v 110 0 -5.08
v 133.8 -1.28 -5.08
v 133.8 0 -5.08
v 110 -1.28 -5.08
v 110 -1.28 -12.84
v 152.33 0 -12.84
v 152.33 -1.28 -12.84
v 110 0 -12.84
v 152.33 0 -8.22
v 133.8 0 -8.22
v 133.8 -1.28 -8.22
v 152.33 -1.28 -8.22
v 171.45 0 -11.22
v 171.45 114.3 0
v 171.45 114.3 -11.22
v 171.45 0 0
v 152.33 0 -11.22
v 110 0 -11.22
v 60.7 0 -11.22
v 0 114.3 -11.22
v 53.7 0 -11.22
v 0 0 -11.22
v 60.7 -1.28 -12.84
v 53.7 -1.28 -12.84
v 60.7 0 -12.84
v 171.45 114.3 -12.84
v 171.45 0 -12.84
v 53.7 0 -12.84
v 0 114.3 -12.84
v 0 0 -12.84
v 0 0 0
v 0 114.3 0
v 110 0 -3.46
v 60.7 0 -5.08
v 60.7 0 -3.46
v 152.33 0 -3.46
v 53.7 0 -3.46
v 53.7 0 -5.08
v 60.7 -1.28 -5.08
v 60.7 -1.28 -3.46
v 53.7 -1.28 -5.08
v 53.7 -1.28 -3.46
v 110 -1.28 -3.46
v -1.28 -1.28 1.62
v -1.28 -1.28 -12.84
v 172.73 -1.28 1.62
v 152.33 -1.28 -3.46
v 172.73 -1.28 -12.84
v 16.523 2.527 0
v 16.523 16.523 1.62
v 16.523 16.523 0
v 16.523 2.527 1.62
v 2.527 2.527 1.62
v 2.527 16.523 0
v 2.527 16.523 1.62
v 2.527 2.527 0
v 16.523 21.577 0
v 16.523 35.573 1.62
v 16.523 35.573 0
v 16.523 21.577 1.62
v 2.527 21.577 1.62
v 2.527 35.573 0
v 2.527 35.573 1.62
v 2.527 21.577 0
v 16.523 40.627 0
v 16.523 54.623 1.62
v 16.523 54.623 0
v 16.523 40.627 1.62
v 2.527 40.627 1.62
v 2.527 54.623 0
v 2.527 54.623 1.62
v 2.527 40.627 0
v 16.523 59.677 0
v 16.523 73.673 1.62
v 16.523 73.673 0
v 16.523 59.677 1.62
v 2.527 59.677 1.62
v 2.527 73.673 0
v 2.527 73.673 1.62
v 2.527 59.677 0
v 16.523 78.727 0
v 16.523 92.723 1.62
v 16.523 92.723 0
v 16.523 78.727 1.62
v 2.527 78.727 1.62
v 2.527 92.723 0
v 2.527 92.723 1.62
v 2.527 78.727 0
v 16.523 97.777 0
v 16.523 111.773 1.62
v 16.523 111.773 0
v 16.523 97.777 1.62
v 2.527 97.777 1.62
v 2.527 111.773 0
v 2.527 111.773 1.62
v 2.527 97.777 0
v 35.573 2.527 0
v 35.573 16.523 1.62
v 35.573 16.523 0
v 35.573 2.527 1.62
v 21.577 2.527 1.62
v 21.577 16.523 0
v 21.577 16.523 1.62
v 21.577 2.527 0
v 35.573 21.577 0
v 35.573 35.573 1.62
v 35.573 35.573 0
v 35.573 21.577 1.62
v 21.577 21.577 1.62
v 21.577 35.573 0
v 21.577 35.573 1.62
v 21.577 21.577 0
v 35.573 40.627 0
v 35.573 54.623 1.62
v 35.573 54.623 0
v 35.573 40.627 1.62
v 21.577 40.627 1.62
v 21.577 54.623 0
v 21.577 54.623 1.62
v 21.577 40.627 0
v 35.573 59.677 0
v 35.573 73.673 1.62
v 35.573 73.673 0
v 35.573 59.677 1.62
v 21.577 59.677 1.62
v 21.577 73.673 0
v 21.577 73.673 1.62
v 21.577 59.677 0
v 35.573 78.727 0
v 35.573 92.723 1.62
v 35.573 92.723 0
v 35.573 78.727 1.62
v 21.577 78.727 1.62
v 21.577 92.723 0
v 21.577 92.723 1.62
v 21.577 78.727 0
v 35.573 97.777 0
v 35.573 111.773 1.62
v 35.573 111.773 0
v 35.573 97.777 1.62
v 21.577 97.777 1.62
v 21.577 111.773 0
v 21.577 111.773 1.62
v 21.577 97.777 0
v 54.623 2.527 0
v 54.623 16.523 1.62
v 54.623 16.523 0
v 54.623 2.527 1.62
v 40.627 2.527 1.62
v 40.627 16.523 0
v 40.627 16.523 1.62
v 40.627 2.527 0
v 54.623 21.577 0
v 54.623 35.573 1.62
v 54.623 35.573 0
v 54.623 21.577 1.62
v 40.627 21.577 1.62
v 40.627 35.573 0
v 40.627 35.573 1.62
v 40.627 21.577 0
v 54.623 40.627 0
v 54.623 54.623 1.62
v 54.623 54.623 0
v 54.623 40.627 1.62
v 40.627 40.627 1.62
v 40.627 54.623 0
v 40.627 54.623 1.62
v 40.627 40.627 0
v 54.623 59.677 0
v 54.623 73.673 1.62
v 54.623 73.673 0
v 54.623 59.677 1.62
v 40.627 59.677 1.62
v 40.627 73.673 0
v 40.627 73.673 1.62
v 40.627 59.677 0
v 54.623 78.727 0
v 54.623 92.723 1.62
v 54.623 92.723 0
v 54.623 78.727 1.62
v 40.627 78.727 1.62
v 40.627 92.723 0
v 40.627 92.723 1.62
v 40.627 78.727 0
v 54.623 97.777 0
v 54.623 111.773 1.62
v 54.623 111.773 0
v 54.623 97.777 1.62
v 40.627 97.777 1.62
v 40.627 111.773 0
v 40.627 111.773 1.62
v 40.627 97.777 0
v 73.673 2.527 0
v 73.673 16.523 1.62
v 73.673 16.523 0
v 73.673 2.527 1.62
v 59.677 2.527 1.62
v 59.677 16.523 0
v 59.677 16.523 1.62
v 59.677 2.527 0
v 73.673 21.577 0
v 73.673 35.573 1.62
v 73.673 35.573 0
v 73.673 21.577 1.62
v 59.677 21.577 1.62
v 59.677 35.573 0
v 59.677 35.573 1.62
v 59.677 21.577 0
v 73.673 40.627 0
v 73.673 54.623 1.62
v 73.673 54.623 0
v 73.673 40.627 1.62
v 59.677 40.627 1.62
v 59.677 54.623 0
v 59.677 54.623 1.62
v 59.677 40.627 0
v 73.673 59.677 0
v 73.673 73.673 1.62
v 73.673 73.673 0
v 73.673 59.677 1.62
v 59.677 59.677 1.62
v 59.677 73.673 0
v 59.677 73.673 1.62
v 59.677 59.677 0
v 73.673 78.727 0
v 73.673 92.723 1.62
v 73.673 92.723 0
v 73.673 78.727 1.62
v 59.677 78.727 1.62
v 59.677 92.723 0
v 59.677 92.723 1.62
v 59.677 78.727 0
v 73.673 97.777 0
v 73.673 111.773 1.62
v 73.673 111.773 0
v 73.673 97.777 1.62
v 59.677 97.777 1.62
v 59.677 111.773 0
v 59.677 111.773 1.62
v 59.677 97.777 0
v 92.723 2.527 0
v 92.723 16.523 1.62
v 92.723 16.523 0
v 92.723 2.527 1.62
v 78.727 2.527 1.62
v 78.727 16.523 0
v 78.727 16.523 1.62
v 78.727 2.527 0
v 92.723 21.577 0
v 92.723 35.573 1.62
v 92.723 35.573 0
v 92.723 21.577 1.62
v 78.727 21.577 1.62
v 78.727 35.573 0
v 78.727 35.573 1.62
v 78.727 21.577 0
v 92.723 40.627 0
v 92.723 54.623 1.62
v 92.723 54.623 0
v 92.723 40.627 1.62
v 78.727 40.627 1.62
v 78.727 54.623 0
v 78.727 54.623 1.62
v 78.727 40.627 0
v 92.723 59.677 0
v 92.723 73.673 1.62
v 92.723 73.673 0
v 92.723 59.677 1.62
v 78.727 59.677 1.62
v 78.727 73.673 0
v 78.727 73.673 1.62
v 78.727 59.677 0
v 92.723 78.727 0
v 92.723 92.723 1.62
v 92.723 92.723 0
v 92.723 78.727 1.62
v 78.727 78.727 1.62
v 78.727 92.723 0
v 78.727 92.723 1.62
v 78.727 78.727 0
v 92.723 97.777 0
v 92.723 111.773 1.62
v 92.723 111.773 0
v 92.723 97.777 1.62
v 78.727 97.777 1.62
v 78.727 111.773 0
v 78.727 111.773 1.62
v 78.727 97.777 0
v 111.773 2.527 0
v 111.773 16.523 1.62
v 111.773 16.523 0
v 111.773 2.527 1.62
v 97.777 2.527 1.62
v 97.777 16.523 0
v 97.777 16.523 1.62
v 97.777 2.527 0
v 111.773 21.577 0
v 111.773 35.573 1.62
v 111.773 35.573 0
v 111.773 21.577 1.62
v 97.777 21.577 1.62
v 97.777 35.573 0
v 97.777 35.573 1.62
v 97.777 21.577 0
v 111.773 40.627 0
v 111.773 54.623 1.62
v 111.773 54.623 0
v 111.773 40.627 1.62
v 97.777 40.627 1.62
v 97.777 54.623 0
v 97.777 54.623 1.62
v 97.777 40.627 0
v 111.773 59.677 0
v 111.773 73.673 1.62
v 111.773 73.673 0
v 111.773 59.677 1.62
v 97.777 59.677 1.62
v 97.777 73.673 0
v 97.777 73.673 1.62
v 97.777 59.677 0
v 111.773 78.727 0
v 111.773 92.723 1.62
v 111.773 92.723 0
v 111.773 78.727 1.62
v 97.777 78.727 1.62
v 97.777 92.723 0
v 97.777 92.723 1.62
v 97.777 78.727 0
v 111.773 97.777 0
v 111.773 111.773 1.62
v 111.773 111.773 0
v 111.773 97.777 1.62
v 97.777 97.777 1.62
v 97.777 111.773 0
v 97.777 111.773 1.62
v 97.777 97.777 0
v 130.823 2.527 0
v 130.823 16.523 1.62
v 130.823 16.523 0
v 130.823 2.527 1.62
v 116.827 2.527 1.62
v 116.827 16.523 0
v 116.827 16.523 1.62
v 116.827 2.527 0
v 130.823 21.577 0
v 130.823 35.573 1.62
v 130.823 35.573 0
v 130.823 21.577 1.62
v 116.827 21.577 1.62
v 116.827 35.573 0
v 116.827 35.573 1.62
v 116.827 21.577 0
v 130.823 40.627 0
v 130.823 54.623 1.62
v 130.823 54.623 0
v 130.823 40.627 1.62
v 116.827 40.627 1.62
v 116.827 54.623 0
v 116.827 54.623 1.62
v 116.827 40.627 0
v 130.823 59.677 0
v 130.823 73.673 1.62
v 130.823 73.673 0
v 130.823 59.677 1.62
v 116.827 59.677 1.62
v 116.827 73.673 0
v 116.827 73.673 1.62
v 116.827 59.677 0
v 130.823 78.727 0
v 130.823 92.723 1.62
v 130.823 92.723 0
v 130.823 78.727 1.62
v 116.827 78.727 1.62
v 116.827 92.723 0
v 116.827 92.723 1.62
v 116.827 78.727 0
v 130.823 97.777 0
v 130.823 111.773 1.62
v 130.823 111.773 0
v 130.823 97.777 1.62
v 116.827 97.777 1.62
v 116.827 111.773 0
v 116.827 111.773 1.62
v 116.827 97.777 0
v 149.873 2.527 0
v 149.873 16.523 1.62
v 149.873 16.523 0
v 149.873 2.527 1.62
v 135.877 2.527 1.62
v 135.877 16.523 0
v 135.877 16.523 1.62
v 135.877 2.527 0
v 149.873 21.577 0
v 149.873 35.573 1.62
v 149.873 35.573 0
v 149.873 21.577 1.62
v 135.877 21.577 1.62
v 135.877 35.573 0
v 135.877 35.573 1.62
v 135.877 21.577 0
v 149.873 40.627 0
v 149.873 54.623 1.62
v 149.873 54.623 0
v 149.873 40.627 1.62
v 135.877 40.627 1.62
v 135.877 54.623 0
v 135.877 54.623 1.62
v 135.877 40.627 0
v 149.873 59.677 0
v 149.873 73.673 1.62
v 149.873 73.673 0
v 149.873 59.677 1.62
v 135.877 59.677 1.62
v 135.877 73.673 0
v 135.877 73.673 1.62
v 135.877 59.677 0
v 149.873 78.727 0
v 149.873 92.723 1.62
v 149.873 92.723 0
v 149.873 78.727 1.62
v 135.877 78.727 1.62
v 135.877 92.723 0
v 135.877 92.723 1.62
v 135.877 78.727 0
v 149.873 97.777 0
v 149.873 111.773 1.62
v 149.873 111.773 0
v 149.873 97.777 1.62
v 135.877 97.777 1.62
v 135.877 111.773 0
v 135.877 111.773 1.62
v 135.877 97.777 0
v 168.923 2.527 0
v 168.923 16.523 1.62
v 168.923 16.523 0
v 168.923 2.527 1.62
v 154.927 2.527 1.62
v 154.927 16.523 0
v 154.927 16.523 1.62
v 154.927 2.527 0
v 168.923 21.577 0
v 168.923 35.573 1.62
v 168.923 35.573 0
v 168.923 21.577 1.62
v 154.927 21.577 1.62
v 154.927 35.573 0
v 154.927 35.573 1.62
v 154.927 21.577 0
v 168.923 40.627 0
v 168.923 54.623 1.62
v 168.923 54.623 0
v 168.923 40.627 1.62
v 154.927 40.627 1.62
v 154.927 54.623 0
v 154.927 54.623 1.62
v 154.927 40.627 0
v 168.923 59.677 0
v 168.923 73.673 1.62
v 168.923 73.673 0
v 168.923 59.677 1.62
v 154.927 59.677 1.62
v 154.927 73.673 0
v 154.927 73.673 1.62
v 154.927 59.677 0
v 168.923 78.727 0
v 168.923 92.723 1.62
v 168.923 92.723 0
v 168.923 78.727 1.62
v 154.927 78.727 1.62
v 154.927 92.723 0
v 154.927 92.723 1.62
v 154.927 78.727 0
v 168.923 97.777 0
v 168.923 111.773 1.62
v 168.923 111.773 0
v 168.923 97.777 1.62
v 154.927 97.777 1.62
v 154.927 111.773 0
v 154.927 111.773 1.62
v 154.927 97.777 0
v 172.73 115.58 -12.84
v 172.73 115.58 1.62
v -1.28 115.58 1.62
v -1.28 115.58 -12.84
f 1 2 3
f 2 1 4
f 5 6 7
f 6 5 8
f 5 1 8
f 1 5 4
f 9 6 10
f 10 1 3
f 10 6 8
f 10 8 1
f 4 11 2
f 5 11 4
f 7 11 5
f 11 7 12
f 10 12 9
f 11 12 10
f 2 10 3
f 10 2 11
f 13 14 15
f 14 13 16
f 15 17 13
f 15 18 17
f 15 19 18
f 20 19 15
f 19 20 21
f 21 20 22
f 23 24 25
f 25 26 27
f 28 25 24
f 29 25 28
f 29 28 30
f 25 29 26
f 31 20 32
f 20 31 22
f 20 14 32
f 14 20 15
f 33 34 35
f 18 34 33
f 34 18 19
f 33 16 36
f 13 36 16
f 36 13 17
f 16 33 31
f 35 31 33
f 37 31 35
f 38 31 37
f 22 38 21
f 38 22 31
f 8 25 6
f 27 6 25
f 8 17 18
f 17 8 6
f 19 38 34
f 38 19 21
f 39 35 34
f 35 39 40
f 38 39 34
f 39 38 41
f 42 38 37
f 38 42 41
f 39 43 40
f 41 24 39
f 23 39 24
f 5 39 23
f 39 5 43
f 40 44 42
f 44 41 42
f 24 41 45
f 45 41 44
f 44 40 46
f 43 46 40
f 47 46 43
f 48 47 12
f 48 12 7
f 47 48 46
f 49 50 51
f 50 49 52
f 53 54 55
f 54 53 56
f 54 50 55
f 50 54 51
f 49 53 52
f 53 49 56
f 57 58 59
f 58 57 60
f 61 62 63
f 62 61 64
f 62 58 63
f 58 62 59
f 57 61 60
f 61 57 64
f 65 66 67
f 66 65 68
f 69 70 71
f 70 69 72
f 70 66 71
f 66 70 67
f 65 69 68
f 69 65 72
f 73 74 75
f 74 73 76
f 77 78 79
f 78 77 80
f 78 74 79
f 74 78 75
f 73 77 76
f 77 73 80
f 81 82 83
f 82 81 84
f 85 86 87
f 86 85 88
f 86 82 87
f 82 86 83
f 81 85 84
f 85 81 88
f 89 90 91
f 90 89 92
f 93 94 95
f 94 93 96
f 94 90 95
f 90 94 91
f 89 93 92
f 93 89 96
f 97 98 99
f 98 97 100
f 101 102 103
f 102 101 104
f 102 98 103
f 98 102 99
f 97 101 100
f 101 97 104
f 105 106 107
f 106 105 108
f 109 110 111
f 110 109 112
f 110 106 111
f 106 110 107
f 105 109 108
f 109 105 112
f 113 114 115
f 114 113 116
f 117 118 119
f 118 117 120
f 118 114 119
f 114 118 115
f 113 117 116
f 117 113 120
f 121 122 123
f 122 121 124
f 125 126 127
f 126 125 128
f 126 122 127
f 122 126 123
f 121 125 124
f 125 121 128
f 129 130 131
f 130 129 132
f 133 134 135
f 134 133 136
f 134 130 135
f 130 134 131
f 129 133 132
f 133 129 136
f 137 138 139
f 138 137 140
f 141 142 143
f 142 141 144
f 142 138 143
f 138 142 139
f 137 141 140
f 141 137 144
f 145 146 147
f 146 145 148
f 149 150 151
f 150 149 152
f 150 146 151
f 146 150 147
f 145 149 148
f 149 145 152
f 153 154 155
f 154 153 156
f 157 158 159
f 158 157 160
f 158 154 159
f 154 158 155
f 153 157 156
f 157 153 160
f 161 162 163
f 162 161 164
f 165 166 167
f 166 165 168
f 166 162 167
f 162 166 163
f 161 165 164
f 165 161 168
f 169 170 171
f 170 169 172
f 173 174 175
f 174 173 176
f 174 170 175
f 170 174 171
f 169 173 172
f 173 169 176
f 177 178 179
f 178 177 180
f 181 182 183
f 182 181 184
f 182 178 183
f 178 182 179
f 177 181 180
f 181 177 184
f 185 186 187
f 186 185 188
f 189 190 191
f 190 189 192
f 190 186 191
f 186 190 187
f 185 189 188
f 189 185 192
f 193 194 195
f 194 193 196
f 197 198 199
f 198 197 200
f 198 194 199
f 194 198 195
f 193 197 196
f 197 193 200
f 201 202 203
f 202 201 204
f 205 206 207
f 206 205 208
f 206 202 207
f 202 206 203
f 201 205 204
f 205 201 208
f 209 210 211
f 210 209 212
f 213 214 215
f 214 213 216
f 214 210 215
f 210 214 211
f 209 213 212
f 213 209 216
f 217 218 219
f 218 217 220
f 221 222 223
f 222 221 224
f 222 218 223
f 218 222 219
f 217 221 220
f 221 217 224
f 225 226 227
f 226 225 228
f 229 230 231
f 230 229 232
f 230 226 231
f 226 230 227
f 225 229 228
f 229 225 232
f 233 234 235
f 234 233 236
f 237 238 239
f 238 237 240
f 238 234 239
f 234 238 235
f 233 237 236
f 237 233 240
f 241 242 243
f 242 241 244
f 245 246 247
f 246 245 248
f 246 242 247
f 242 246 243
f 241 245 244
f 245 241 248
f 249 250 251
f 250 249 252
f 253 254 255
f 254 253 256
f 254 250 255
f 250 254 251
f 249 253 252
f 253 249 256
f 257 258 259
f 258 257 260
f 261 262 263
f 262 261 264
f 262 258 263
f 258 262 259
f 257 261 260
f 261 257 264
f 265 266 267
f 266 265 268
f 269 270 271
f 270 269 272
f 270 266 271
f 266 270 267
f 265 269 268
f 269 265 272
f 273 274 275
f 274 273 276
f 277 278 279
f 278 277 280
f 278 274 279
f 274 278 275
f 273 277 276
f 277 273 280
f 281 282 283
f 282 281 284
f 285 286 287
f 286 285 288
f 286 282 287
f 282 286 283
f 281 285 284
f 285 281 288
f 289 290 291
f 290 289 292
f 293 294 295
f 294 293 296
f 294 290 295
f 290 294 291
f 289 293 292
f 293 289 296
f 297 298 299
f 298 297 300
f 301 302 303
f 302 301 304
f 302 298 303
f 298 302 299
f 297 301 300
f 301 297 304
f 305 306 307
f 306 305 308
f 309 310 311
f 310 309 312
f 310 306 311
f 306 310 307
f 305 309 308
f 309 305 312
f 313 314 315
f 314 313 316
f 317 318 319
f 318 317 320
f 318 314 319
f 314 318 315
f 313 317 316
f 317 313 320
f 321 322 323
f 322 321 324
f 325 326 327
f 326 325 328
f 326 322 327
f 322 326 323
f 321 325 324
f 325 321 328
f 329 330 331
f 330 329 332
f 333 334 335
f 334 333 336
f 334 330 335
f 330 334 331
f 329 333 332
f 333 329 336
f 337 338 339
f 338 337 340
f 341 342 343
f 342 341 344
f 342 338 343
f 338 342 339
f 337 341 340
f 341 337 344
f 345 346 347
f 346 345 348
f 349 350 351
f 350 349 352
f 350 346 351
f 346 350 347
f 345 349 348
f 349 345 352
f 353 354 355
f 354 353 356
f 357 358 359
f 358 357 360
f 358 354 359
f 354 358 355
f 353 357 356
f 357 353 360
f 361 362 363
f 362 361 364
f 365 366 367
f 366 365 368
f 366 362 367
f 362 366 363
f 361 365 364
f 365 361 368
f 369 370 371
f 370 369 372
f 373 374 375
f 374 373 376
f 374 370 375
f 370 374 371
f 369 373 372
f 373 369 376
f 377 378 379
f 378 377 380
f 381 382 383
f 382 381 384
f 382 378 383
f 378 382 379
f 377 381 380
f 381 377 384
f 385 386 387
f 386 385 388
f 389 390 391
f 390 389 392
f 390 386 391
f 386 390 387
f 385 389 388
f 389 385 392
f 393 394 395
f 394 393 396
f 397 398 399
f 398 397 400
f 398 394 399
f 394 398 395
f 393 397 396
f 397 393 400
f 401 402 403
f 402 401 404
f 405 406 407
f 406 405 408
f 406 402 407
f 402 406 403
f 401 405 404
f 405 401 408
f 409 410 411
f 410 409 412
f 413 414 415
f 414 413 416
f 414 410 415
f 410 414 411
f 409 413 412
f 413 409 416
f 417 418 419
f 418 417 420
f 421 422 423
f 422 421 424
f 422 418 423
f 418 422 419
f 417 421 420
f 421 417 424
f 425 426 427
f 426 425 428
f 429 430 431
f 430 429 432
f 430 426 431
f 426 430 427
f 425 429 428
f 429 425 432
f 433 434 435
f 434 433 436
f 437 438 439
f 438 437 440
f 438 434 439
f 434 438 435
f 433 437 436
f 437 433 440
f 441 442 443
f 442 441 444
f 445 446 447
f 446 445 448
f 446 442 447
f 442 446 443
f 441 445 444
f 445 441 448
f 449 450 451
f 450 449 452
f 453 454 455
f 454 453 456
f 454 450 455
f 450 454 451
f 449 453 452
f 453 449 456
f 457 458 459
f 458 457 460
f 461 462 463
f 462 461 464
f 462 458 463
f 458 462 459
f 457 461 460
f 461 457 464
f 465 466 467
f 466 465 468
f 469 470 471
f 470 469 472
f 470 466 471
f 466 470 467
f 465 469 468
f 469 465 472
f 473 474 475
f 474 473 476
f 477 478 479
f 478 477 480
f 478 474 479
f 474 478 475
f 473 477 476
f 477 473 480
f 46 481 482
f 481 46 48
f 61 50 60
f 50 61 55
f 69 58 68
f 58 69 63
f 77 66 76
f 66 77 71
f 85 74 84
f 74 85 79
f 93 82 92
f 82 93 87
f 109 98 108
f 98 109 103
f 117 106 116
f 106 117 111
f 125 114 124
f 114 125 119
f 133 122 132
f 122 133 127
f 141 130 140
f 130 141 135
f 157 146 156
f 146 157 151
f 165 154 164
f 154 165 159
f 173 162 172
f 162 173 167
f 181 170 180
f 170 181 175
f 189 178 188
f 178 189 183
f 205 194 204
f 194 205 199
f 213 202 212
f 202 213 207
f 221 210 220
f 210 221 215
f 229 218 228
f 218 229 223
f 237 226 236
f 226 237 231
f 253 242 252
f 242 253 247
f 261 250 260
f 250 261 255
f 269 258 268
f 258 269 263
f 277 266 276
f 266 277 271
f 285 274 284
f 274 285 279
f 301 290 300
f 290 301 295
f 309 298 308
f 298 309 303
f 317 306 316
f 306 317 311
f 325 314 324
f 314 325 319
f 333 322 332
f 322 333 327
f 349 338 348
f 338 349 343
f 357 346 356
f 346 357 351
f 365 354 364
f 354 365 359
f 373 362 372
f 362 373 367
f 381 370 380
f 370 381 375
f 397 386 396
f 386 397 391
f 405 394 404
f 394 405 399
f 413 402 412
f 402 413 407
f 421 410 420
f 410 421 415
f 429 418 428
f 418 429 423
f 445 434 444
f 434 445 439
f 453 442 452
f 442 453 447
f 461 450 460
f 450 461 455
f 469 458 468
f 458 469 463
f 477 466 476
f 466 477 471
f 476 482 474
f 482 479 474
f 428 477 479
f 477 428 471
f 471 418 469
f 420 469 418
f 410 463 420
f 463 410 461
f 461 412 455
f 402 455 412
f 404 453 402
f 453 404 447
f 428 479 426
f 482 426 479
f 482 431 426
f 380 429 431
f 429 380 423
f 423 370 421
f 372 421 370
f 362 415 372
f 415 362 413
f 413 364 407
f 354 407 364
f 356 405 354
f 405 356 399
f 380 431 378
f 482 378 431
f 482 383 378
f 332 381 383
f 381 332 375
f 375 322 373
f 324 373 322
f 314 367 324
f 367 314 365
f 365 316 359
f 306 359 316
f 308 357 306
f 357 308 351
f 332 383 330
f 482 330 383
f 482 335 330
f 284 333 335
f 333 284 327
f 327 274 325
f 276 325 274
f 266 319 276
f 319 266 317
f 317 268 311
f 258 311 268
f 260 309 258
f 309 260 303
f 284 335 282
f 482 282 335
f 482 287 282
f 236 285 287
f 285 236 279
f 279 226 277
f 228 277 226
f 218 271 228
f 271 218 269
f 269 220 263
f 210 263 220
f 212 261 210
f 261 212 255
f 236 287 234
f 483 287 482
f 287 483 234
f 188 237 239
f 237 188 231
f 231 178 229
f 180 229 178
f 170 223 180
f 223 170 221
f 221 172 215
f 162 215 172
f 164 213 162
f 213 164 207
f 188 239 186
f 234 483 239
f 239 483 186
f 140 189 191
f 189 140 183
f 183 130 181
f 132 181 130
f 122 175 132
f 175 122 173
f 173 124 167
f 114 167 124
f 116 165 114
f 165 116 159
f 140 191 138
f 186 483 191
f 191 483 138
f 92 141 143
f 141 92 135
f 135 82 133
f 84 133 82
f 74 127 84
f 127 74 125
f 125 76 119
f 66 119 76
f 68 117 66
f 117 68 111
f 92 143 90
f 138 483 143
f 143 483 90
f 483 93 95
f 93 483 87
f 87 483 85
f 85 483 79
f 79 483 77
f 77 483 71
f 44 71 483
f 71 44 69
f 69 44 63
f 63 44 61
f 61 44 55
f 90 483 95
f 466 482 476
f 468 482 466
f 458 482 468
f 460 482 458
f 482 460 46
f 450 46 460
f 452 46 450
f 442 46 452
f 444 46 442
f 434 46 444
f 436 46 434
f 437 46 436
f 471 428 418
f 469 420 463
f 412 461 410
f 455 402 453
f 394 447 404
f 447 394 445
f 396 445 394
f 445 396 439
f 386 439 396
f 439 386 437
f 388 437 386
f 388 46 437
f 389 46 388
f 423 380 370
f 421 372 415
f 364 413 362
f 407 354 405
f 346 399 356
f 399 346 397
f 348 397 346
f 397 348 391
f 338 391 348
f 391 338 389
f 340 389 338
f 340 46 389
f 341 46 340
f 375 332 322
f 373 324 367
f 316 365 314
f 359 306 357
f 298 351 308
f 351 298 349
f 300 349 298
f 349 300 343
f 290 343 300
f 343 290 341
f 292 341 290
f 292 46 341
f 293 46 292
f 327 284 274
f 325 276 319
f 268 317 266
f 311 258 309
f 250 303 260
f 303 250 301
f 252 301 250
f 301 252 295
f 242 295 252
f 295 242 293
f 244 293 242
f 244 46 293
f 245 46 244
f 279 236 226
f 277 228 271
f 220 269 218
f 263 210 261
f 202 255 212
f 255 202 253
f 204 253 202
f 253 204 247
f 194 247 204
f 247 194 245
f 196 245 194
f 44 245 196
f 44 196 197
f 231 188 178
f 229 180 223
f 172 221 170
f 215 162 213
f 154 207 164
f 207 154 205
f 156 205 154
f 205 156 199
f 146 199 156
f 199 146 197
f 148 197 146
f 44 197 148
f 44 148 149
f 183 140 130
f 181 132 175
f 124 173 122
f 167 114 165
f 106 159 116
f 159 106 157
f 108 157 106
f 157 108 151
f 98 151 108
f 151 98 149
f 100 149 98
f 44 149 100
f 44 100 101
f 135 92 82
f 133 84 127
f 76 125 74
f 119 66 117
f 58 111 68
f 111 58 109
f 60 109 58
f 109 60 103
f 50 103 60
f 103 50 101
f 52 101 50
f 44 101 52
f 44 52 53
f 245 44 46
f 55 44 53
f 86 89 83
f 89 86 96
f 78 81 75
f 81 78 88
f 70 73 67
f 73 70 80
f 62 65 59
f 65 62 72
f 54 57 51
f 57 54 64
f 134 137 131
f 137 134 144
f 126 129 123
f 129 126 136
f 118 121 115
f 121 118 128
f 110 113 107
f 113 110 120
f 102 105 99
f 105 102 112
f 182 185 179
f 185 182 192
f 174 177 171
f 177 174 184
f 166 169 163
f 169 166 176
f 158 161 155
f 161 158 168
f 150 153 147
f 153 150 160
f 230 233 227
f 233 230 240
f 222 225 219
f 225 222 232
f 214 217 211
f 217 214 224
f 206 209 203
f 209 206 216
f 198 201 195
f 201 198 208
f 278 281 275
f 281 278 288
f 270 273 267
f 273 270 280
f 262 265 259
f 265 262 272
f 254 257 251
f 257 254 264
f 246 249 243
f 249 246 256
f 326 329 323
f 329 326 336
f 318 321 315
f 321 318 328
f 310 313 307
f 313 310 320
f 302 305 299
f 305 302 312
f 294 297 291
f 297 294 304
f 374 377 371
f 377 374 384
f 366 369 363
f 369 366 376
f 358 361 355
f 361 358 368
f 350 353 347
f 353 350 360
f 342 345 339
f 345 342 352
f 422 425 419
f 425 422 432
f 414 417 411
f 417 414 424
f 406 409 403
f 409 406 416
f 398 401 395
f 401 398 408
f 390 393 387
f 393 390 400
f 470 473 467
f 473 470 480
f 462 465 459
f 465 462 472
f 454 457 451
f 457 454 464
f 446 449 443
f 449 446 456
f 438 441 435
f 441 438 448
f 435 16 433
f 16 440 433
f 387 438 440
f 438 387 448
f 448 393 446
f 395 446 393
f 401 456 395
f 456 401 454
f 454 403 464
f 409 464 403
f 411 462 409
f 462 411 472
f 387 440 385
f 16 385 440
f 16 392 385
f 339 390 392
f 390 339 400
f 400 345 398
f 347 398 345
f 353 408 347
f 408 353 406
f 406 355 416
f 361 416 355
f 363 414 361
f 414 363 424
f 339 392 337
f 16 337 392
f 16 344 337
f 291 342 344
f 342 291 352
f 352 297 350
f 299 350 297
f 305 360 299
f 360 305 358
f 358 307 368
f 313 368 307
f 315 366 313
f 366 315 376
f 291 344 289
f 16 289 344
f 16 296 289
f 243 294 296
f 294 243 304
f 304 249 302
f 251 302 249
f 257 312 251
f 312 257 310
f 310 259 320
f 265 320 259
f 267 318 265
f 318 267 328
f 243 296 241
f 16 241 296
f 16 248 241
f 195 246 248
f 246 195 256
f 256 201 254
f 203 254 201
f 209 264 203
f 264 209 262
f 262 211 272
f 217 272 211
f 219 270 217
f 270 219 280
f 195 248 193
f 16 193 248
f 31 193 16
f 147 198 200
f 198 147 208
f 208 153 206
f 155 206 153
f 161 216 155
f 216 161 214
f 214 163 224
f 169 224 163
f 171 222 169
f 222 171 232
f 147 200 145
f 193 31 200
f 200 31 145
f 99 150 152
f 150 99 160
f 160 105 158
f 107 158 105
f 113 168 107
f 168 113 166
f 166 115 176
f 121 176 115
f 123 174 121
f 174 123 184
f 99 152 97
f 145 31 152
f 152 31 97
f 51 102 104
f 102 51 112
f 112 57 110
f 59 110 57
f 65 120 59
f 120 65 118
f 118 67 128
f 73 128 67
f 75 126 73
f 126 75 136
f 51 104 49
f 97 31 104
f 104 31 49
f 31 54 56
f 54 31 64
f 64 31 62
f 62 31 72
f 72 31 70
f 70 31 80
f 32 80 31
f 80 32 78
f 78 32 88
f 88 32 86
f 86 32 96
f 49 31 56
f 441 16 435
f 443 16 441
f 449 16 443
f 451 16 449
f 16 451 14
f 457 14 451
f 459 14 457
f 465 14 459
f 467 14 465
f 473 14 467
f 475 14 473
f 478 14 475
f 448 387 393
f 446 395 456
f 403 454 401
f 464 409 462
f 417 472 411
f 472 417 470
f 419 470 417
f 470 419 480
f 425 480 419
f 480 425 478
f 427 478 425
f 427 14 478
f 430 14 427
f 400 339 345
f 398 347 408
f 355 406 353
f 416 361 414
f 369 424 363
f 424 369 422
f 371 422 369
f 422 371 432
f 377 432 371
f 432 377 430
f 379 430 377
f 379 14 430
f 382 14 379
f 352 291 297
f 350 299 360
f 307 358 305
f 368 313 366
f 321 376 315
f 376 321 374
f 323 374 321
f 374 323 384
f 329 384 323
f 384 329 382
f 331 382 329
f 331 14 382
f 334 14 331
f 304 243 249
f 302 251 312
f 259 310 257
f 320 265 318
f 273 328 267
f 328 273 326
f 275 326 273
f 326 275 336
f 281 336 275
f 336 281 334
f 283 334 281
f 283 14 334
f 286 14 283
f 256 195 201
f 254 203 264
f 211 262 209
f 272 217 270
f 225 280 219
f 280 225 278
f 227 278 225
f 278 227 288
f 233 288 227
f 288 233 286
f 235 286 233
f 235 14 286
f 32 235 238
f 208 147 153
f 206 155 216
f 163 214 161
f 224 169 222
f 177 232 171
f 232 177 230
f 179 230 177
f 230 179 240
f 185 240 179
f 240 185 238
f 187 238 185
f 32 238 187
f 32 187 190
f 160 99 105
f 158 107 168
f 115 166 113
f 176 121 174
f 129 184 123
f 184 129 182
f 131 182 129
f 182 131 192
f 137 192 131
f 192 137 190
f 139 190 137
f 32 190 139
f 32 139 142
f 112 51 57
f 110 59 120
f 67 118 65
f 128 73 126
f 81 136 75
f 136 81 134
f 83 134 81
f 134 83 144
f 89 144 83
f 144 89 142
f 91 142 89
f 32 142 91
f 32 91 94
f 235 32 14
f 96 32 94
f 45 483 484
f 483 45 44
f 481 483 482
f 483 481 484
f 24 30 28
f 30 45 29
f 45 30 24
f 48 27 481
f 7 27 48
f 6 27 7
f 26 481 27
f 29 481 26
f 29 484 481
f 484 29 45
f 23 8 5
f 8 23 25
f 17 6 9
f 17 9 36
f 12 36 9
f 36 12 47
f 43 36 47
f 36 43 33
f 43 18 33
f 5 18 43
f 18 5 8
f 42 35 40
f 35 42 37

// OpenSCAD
/*
 * consider sawing of jack
 * consider rounding corners
 * front needs design
 * find min height
 * add jacks
 * add reset button
 */

// non-design measurements
key_spacing = 19.05;
key_cutout_w = .551*25.4;

pcb_x = 171.45;
pcb_y = 116.60;
pcb_y2 = 111.8;
bump_out = pcb_y - pcb_y2;
bump_in = 6*key_spacing - pcb_y2;
pcb_thickness = 1.62;
bump1_x = 19.12; // from the other side
bump1_w = 42.33;
bump2_x = 53.7;
bump2_w = 7.00;

usb_pcb_thicc = 3.14;
usb_pcb_width = 18.53;


//distance from the top of the pcb to the
top_layer_thickness = .197 * 25.4;
// distance from the bottom of the pcb to the bottom of the keycaps
a = .43*25.4;
// distance from the bot of the case to the top of the pcb
cutout_h = .20 * 25.4 - pcb_thickness;

stud_diameter = 4.0;
stud_locations = [
    [1,1], [1,2], [1,3], [1,4],
    [3,1], [3,2], [3,3], [3,5],
    [6,1], [6,2], [6,3], [6,5], 
    [8,1], [8,2], [8,4], [8,5], 
];

// design measurements

//layer_height = .35;
wall_thicc = 1.28;
bott_solder_room = 3;
// doesn't actually include top layer
tot_height = cutout_h + usb_pcb_thicc + 2 * pcb_thickness + bott_solder_room; 

module top_test(){
    difference(){
        cube([key_spacing,key_spacing,pcb_thickness], center=true);
        cube([key_cutout_w,key_cutout_w,pcb_thickness*2], center=true);
    }
}

module top_layer_old(){
    difference(){
        for(i=[.5:9.5],j=[.5:6.5]){
            translate([i*key_spacing, j*key_spacing, pcb_thickness/2]) cube([key_cutout_w,key_cutout_w,pcb_thickness*2], center=true);
        }
    }
}

module top_shell(){
    //top part
    difference(){
        translate([-wall_thicc,-wall_thicc,0])
            cube([key_spacing*9+2*wall_thicc, key_spacing*6+2*wall_thicc, pcb_thickness]);
        for(i=[.5:9.5],j=[.5:6.5]){
            translate([i*key_spacing, j*key_spacing, pcb_thickness/2]) cube([key_cutout_w,key_cutout_w,pcb_thickness*2], center=true);
        }
    }
    //walls
    difference(){
        translate([-wall_thicc,-wall_thicc,-tot_height])
            cube([key_spacing*9+2*wall_thicc, key_spacing*6+2*wall_thicc, tot_height]);
        translate([0,0,-tot_height-1])
            cube([key_spacing*9, key_spacing*6, tot_height+2]);
        
        //gaps for jack, usb
        translate([key_spacing*9-bump1_x-bump1_w,-wall_thicc*1.5,-cutout_h-tot_height])
            cube([bump1_w,wall_thicc*2,tot_height]);
        translate([bump2_x,-wall_thicc*1.5,-cutout_h-tot_height])
            cube([bump2_w,wall_thicc*2,tot_height]);
    }
}
ungap_height = tot_height-cutout_h-pcb_thickness;
module bottom_shell(){
        cube([key_spacing*9, key_spacing*6, pcb_thickness]);
    //gaps for jack, usb
    translate([key_spacing*9-bump1_x-bump1_w,-wall_thicc,0]){
        difference(){
            cube([bump1_w,wall_thicc,ungap_height]);
            translate([bump1_w-usb_pcb_width,-wall_thicc/2,ungap_height-usb_pcb_thicc])
                cube([usb_pcb_width+.1,wall_thicc*2,usb_pcb_thicc+.1]);
        }
    }
    translate([bump2_x,-wall_thicc,0])
        cube([bump2_w,wall_thicc,ungap_height]);
    
}

translate([0,0,-1*tot_height]) #bottom_shell();

top_shell();
